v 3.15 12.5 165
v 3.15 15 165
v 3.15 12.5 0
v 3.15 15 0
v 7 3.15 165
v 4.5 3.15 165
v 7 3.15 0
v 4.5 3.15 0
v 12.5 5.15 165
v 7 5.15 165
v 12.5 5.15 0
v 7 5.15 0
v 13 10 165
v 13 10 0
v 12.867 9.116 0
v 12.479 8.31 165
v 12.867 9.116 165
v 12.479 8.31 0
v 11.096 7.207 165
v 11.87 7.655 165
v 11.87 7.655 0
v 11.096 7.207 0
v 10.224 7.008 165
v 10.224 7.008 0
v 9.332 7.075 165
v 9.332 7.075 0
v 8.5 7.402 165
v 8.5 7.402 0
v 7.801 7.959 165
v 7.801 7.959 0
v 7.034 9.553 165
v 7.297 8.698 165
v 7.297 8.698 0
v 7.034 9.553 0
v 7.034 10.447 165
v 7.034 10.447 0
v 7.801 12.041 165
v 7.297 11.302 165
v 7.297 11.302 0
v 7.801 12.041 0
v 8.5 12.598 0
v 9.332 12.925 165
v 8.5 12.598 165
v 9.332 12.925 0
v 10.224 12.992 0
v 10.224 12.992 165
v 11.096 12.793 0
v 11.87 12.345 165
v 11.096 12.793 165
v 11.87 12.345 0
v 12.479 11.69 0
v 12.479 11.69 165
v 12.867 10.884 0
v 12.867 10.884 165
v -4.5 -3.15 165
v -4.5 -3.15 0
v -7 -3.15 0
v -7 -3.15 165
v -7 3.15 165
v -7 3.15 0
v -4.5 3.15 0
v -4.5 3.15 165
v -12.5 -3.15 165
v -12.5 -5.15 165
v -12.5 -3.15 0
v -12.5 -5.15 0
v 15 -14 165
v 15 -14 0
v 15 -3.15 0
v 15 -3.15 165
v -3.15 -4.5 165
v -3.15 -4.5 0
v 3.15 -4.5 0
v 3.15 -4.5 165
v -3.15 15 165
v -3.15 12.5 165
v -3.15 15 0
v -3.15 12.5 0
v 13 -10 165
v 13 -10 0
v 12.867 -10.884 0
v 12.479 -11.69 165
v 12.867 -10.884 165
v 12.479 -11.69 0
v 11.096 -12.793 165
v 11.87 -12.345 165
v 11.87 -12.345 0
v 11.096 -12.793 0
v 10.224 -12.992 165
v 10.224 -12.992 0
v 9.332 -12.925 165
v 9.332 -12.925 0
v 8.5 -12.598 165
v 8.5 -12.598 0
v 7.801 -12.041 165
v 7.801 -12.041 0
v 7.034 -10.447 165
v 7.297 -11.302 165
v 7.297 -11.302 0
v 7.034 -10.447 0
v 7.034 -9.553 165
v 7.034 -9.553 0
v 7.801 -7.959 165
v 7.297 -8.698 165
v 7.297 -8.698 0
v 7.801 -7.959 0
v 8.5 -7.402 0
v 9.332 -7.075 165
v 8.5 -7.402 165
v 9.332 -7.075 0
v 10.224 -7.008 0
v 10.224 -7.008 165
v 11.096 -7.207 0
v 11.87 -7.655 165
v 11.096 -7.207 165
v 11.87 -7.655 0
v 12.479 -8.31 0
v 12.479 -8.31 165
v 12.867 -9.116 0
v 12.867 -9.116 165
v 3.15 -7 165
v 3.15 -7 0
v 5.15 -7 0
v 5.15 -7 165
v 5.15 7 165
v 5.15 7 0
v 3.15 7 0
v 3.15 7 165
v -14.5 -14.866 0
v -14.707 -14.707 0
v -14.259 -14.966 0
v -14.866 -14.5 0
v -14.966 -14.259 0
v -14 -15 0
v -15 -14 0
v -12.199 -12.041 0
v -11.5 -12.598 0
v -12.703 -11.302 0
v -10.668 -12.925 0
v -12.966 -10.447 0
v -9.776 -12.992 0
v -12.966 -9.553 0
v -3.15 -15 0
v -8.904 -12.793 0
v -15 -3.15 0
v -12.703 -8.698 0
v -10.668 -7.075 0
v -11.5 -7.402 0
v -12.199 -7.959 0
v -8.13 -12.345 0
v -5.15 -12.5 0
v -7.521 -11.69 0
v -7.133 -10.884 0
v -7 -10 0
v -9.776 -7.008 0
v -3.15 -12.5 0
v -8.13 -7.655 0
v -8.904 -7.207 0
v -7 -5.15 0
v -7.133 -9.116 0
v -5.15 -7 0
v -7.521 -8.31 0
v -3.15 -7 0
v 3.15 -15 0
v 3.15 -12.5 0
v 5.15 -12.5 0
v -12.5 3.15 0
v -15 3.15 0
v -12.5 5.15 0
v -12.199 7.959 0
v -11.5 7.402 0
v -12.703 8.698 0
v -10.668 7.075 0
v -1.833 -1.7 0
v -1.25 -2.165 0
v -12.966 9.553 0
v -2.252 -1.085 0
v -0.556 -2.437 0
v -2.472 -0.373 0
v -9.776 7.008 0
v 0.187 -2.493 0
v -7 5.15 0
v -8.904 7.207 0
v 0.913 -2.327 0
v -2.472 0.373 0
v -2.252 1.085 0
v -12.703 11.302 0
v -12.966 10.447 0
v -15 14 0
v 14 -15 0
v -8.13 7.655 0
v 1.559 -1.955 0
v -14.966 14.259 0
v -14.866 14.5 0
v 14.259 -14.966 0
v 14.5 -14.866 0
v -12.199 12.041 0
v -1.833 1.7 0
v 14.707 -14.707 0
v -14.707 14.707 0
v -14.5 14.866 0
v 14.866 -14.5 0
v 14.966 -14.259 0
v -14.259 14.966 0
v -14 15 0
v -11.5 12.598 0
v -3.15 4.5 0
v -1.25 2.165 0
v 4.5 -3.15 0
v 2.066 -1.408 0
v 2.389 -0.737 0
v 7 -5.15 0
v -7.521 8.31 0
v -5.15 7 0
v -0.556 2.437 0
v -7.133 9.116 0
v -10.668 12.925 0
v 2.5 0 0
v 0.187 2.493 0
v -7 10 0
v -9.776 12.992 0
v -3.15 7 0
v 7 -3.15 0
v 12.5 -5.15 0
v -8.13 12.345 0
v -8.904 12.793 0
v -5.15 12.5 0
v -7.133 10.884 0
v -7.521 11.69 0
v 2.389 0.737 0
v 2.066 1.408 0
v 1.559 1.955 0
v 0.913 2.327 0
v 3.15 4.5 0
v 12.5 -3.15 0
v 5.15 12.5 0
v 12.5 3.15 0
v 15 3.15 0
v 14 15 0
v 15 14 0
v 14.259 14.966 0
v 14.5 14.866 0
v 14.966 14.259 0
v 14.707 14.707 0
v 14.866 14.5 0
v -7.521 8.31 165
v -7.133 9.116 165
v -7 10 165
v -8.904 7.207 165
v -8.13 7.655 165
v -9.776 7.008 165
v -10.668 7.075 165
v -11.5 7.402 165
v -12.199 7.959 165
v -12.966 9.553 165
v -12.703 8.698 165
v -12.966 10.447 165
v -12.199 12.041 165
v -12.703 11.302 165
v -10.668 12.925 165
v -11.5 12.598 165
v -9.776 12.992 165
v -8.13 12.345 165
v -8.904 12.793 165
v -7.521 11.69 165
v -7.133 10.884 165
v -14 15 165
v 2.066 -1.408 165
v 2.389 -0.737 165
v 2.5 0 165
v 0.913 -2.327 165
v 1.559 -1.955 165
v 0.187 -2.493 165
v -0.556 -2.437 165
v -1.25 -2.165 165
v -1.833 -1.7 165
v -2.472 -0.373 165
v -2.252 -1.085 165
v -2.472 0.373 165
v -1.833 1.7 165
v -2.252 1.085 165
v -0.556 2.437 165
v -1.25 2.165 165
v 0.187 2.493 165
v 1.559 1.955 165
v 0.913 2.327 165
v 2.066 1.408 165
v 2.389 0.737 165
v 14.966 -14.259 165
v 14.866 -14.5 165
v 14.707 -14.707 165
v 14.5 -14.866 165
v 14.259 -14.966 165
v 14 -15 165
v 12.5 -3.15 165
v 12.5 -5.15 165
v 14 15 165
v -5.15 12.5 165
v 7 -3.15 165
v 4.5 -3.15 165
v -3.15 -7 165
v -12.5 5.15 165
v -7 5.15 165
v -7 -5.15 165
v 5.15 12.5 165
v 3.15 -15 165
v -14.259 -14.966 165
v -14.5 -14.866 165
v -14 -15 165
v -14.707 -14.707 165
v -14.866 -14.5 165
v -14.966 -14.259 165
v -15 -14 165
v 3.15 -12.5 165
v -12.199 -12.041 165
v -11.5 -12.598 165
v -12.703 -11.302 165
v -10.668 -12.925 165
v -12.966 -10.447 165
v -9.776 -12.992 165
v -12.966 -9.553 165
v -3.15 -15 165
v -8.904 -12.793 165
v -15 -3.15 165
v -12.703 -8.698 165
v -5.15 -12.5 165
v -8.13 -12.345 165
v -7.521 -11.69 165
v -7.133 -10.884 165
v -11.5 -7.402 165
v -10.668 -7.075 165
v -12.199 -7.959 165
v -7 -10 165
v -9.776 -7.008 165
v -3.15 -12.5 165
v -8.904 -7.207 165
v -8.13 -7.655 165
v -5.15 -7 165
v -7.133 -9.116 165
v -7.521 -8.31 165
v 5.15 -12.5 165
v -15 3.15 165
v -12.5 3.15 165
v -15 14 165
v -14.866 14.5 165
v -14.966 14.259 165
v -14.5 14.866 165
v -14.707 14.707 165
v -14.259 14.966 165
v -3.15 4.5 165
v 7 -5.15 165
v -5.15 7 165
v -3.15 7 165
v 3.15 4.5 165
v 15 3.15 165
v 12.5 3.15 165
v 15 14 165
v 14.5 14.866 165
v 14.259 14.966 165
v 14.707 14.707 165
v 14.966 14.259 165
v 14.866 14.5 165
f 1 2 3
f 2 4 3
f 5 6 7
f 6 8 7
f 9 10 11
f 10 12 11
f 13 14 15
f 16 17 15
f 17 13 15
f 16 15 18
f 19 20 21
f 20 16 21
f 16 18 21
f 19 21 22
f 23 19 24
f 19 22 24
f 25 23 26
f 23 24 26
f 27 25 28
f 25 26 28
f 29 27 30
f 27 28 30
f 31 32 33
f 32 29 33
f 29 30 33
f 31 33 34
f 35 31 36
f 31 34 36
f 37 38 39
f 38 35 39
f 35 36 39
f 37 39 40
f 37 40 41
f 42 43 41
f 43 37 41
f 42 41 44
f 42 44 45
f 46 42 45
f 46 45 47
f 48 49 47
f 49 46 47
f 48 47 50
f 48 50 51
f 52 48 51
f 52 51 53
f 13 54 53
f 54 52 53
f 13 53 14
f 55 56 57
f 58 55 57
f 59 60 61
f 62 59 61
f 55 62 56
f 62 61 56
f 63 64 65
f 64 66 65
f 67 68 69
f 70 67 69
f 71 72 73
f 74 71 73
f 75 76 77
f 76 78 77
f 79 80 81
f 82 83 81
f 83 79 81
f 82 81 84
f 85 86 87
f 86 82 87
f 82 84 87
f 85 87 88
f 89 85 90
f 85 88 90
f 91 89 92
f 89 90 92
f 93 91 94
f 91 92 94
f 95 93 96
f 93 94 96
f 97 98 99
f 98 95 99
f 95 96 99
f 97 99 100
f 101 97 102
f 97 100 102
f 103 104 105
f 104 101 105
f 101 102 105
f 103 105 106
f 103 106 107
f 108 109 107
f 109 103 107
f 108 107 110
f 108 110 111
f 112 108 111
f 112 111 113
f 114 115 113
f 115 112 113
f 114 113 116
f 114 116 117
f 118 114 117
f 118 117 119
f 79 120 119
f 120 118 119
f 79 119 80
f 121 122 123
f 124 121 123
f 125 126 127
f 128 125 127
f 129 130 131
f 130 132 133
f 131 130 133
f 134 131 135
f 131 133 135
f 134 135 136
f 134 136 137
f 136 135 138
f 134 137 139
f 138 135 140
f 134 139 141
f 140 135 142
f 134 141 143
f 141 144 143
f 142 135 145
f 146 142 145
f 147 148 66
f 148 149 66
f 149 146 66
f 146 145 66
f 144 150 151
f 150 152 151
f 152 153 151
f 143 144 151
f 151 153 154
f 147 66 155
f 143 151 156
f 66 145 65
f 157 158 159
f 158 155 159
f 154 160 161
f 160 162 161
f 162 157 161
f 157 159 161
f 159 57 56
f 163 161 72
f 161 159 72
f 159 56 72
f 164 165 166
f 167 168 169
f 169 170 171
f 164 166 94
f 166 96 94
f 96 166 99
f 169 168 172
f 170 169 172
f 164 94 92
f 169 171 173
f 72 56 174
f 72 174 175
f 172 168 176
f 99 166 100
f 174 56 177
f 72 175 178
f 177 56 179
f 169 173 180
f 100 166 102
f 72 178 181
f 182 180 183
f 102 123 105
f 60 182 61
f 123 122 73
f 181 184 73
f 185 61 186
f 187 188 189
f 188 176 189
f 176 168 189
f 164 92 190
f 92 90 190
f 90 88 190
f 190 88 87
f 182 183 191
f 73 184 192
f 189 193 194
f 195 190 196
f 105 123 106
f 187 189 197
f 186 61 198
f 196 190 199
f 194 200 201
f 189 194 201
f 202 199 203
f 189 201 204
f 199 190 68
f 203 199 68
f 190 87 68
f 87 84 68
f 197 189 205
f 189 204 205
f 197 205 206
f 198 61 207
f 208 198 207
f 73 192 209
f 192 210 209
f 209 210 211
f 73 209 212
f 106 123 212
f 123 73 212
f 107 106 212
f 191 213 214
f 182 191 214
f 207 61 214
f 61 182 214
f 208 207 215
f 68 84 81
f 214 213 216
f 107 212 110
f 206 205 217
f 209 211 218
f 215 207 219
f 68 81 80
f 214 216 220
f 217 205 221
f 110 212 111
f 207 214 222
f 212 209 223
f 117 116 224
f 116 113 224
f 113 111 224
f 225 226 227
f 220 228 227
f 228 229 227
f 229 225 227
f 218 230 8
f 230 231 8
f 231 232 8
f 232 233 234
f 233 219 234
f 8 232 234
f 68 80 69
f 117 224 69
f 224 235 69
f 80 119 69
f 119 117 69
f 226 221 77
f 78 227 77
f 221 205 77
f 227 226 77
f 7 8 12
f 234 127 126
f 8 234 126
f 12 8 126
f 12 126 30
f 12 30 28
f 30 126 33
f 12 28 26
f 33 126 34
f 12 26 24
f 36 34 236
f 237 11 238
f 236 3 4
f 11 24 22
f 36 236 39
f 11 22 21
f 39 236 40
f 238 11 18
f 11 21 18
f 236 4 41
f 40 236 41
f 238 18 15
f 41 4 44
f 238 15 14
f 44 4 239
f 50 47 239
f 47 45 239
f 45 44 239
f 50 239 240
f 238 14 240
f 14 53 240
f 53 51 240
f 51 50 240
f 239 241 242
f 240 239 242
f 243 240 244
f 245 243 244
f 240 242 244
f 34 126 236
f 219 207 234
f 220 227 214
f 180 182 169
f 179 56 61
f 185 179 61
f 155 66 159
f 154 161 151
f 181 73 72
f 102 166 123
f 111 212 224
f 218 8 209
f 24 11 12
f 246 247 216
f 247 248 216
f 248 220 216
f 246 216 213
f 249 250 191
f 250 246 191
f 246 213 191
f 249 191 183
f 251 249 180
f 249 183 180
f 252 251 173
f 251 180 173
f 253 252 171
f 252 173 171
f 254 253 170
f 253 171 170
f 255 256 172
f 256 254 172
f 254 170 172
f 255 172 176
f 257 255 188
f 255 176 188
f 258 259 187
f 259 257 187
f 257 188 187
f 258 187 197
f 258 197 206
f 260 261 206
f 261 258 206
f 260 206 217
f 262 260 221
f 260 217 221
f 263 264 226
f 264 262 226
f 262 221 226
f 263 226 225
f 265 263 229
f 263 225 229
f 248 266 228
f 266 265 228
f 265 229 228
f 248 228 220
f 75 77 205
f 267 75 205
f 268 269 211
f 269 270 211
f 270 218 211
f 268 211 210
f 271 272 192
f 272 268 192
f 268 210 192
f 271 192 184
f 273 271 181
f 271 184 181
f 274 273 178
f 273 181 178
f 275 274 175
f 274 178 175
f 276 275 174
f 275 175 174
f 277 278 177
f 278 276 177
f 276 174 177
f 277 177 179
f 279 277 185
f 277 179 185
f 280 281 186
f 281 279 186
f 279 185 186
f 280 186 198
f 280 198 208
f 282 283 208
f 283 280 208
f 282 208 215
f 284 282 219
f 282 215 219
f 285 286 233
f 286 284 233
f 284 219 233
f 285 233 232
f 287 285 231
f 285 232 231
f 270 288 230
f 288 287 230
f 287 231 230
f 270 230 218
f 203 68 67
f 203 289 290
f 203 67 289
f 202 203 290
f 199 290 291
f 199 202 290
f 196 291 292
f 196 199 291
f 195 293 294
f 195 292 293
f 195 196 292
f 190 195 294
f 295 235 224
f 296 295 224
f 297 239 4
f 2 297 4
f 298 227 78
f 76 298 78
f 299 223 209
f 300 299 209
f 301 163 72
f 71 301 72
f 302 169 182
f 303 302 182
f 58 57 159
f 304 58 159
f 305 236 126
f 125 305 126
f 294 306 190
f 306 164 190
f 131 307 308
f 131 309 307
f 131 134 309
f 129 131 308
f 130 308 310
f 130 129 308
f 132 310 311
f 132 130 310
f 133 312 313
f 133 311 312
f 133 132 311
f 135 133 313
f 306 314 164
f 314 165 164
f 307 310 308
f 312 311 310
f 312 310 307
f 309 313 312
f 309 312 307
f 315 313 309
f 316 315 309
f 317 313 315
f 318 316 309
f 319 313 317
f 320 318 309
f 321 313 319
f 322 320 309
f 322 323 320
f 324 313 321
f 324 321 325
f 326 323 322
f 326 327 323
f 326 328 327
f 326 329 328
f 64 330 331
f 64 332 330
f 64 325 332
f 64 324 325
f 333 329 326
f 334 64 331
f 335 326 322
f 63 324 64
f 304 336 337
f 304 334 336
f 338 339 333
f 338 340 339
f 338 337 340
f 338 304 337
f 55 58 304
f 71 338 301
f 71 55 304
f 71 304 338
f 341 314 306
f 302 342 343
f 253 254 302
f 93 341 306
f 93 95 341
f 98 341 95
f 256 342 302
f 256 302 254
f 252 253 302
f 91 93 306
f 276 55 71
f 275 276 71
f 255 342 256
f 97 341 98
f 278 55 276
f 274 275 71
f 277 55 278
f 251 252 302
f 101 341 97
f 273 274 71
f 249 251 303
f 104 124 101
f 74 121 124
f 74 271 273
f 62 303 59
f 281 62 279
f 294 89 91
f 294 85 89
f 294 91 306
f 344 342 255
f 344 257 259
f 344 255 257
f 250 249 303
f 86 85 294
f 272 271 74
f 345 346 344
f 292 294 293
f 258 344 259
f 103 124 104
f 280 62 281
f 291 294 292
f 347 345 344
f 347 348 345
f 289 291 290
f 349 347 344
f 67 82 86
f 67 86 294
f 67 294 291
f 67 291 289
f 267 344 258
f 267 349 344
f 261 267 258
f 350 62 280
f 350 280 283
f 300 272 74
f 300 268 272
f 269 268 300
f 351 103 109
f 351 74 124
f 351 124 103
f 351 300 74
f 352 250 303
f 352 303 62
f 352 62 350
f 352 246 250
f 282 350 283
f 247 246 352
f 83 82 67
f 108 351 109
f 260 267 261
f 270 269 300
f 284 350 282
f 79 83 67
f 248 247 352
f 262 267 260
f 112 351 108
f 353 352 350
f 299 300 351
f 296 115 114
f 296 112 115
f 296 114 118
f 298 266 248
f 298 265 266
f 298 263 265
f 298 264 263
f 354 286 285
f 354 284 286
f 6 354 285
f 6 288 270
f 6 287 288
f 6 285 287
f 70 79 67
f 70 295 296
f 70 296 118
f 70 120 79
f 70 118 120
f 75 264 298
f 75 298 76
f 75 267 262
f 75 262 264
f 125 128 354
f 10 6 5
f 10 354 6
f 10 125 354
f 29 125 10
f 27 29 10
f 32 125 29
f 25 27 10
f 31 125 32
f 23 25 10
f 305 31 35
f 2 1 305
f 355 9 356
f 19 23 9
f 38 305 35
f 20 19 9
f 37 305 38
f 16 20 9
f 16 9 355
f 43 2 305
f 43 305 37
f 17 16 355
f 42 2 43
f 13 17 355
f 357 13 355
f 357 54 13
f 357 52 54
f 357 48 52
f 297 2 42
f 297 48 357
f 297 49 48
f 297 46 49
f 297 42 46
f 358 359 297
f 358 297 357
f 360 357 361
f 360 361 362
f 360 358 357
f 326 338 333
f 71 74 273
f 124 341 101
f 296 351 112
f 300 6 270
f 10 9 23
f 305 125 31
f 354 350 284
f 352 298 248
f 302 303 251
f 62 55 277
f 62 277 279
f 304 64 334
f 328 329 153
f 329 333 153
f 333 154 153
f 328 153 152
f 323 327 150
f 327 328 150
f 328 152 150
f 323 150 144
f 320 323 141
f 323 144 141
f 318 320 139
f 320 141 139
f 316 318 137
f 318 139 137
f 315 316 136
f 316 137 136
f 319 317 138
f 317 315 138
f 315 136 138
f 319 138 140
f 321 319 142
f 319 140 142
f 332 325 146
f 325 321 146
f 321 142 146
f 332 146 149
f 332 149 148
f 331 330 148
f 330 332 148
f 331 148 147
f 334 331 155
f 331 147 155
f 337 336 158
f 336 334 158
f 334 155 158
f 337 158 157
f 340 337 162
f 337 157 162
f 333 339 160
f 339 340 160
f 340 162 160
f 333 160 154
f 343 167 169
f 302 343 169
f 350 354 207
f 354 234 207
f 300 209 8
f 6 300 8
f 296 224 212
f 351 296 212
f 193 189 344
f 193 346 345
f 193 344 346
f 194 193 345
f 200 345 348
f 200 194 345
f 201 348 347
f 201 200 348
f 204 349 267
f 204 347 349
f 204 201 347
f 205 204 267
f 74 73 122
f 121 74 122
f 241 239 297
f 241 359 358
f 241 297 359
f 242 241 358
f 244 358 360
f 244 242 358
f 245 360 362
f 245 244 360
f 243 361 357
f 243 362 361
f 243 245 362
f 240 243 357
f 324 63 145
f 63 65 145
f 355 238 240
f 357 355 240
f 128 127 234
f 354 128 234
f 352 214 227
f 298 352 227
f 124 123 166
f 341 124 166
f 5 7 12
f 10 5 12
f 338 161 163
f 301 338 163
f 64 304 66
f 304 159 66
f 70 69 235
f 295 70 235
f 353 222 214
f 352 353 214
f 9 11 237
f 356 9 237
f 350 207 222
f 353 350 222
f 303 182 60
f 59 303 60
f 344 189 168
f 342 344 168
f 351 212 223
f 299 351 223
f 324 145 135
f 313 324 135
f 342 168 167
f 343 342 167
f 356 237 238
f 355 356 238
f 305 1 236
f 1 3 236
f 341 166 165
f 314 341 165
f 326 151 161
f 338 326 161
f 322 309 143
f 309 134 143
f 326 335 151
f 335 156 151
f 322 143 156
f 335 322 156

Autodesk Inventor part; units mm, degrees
ref_plane "YZ Plane" through (0, 0, 0) normal (1, 0, 0) x (0, 1, 0)
ref_plane "XZ Plane" through (0, 0, 0) normal (0, 1, 0) x (-1, 0, 0)
ref_plane "XY Plane" through (0, 0, 0) normal (0, 0, 1) x (1, 0, 0)
feature "ソリッド1" [suppressed]
sketch "スケッチ2" plane through (0, 0, 0) normal (0, 0, 1) x (1, 0, 0)
  line L0 (-12.5, 5.15) -> (-7, 5.15) projected
  line L1 (-7, 5.15) -> (-7, 3.15) projected
  line L2 (-7, 3.15) -> (-4.5, 3.15) projected
  line L3 (-4.5, 3.15) -> (-4.5, -3.15) projected
  line L4 (-4.5, -3.15) -> (-7, -3.15) projected
  line L5 (-7, -3.15) -> (-7, -5.15) projected
  line L6 (-7, -5.15) -> (-12.5, -5.15) projected
  line L7 (-12.5, -5.15) -> (-12.5, -3.15) projected
  line L8 (-12.5, -3.15) -> (-15, -3.15) projected
  line L9 (-15, -3.15) -> (-15, -14) projected
  arc A0 (-15, -14) -> (-14, -15) centre (-14, -14) ccw projected
  line L10 (-14, -15) -> (-3.15, -15) projected
  line L11 (-3.15, -15) -> (-3.15, -12.5) projected
  line L12 (-3.15, -12.5) -> (-5.15, -12.5) projected
  line L13 (-5.15, -12.5) -> (-5.15, -7) projected
  line L14 (-5.15, -7) -> (-3.15, -7) projected
  line L15 (-3.15, -7) -> (-3.15, -4.5) projected
  line L16 (-3.15, -4.5) -> (3.15, -4.5) projected
  line L17 (3.15, -4.5) -> (3.15, -7) projected
  line L18 (3.15, -7) -> (5.15, -7) projected
  line L19 (5.15, -7) -> (5.15, -12.5) projected
  line L20 (5.15, -12.5) -> (3.15, -12.5) projected
  line L21 (3.15, -12.5) -> (3.15, -15) projected
  line L22 (3.15, -15) -> (14, -15) projected
  arc A1 (14, -15) -> (15, -14) centre (14, -14) ccw projected
  line L23 (15, -14) -> (15, -3.15) projected
  line L24 (15, -3.15) -> (12.5, -3.15) projected
  line L25 (12.5, -3.15) -> (12.5, -5.15) projected
  line L26 (12.5, -5.15) -> (7, -5.15) projected
  line L27 (7, -5.15) -> (7, -3.15) projected
  line L28 (7, -3.15) -> (4.5, -3.15) projected
  line L29 (4.5, -3.15) -> (4.5, 3.15) projected
  line L30 (4.5, 3.15) -> (7, 3.15) projected
  line L31 (7, 3.15) -> (7, 5.15) projected
  line L32 (7, 5.15) -> (12.5, 5.15) projected
  line L33 (12.5, 5.15) -> (12.5, 3.15) projected
  line L34 (12.5, 3.15) -> (15, 3.15) projected
  line L35 (15, 3.15) -> (15, 14) projected
  arc A2 (15, 14) -> (14, 15) centre (14, 14) ccw projected
  line L36 (14, 15) -> (3.15, 15) projected
  line L37 (3.15, 15) -> (3.15, 12.5) projected
  line L38 (3.15, 12.5) -> (5.15, 12.5) projected
  line L39 (5.15, 12.5) -> (5.15, 7) projected
  line L40 (5.15, 7) -> (3.15, 7) projected
  line L41 (3.15, 7) -> (3.15, 4.5) projected
  line L42 (3.15, 4.5) -> (-3.15, 4.5) projected
  line L43 (-3.15, 4.5) -> (-3.15, 7) projected
  line L44 (-3.15, 7) -> (-5.15, 7) projected
  line L45 (-5.15, 7) -> (-5.15, 12.5) projected
  line L46 (-5.15, 12.5) -> (-3.15, 12.5) projected
  line L47 (-3.15, 12.5) -> (-3.15, 15) projected
  line L48 (-3.15, 15) -> (-14, 15) projected
  arc A3 (-14, 15) -> (-15, 14) centre (-14, 14) ccw projected
  line L49 (-15, 14) -> (-15, 3.15) projected
  line L50 (-15, 3.15) -> (-12.5, 3.15) projected
  line L51 (-12.5, 3.15) -> (-12.5, 5.15) projected
  circle A4 centre (10, 10) radius 3 projected
  circle A5 centre (-10, 10) radius 3 projected
  circle A6 centre (-10, -10) radius 3 projected
  circle A7 centre (10, -10) radius 3 projected
  circle A8 centre (0, 0) radius 2.5 projected
extrude "押し出し1" add sketch "スケッチ2" along normal blind 165
equation "\"d1\" = L"
equation "\"L\" = 165"
properties part number "AFS-3030-200"
